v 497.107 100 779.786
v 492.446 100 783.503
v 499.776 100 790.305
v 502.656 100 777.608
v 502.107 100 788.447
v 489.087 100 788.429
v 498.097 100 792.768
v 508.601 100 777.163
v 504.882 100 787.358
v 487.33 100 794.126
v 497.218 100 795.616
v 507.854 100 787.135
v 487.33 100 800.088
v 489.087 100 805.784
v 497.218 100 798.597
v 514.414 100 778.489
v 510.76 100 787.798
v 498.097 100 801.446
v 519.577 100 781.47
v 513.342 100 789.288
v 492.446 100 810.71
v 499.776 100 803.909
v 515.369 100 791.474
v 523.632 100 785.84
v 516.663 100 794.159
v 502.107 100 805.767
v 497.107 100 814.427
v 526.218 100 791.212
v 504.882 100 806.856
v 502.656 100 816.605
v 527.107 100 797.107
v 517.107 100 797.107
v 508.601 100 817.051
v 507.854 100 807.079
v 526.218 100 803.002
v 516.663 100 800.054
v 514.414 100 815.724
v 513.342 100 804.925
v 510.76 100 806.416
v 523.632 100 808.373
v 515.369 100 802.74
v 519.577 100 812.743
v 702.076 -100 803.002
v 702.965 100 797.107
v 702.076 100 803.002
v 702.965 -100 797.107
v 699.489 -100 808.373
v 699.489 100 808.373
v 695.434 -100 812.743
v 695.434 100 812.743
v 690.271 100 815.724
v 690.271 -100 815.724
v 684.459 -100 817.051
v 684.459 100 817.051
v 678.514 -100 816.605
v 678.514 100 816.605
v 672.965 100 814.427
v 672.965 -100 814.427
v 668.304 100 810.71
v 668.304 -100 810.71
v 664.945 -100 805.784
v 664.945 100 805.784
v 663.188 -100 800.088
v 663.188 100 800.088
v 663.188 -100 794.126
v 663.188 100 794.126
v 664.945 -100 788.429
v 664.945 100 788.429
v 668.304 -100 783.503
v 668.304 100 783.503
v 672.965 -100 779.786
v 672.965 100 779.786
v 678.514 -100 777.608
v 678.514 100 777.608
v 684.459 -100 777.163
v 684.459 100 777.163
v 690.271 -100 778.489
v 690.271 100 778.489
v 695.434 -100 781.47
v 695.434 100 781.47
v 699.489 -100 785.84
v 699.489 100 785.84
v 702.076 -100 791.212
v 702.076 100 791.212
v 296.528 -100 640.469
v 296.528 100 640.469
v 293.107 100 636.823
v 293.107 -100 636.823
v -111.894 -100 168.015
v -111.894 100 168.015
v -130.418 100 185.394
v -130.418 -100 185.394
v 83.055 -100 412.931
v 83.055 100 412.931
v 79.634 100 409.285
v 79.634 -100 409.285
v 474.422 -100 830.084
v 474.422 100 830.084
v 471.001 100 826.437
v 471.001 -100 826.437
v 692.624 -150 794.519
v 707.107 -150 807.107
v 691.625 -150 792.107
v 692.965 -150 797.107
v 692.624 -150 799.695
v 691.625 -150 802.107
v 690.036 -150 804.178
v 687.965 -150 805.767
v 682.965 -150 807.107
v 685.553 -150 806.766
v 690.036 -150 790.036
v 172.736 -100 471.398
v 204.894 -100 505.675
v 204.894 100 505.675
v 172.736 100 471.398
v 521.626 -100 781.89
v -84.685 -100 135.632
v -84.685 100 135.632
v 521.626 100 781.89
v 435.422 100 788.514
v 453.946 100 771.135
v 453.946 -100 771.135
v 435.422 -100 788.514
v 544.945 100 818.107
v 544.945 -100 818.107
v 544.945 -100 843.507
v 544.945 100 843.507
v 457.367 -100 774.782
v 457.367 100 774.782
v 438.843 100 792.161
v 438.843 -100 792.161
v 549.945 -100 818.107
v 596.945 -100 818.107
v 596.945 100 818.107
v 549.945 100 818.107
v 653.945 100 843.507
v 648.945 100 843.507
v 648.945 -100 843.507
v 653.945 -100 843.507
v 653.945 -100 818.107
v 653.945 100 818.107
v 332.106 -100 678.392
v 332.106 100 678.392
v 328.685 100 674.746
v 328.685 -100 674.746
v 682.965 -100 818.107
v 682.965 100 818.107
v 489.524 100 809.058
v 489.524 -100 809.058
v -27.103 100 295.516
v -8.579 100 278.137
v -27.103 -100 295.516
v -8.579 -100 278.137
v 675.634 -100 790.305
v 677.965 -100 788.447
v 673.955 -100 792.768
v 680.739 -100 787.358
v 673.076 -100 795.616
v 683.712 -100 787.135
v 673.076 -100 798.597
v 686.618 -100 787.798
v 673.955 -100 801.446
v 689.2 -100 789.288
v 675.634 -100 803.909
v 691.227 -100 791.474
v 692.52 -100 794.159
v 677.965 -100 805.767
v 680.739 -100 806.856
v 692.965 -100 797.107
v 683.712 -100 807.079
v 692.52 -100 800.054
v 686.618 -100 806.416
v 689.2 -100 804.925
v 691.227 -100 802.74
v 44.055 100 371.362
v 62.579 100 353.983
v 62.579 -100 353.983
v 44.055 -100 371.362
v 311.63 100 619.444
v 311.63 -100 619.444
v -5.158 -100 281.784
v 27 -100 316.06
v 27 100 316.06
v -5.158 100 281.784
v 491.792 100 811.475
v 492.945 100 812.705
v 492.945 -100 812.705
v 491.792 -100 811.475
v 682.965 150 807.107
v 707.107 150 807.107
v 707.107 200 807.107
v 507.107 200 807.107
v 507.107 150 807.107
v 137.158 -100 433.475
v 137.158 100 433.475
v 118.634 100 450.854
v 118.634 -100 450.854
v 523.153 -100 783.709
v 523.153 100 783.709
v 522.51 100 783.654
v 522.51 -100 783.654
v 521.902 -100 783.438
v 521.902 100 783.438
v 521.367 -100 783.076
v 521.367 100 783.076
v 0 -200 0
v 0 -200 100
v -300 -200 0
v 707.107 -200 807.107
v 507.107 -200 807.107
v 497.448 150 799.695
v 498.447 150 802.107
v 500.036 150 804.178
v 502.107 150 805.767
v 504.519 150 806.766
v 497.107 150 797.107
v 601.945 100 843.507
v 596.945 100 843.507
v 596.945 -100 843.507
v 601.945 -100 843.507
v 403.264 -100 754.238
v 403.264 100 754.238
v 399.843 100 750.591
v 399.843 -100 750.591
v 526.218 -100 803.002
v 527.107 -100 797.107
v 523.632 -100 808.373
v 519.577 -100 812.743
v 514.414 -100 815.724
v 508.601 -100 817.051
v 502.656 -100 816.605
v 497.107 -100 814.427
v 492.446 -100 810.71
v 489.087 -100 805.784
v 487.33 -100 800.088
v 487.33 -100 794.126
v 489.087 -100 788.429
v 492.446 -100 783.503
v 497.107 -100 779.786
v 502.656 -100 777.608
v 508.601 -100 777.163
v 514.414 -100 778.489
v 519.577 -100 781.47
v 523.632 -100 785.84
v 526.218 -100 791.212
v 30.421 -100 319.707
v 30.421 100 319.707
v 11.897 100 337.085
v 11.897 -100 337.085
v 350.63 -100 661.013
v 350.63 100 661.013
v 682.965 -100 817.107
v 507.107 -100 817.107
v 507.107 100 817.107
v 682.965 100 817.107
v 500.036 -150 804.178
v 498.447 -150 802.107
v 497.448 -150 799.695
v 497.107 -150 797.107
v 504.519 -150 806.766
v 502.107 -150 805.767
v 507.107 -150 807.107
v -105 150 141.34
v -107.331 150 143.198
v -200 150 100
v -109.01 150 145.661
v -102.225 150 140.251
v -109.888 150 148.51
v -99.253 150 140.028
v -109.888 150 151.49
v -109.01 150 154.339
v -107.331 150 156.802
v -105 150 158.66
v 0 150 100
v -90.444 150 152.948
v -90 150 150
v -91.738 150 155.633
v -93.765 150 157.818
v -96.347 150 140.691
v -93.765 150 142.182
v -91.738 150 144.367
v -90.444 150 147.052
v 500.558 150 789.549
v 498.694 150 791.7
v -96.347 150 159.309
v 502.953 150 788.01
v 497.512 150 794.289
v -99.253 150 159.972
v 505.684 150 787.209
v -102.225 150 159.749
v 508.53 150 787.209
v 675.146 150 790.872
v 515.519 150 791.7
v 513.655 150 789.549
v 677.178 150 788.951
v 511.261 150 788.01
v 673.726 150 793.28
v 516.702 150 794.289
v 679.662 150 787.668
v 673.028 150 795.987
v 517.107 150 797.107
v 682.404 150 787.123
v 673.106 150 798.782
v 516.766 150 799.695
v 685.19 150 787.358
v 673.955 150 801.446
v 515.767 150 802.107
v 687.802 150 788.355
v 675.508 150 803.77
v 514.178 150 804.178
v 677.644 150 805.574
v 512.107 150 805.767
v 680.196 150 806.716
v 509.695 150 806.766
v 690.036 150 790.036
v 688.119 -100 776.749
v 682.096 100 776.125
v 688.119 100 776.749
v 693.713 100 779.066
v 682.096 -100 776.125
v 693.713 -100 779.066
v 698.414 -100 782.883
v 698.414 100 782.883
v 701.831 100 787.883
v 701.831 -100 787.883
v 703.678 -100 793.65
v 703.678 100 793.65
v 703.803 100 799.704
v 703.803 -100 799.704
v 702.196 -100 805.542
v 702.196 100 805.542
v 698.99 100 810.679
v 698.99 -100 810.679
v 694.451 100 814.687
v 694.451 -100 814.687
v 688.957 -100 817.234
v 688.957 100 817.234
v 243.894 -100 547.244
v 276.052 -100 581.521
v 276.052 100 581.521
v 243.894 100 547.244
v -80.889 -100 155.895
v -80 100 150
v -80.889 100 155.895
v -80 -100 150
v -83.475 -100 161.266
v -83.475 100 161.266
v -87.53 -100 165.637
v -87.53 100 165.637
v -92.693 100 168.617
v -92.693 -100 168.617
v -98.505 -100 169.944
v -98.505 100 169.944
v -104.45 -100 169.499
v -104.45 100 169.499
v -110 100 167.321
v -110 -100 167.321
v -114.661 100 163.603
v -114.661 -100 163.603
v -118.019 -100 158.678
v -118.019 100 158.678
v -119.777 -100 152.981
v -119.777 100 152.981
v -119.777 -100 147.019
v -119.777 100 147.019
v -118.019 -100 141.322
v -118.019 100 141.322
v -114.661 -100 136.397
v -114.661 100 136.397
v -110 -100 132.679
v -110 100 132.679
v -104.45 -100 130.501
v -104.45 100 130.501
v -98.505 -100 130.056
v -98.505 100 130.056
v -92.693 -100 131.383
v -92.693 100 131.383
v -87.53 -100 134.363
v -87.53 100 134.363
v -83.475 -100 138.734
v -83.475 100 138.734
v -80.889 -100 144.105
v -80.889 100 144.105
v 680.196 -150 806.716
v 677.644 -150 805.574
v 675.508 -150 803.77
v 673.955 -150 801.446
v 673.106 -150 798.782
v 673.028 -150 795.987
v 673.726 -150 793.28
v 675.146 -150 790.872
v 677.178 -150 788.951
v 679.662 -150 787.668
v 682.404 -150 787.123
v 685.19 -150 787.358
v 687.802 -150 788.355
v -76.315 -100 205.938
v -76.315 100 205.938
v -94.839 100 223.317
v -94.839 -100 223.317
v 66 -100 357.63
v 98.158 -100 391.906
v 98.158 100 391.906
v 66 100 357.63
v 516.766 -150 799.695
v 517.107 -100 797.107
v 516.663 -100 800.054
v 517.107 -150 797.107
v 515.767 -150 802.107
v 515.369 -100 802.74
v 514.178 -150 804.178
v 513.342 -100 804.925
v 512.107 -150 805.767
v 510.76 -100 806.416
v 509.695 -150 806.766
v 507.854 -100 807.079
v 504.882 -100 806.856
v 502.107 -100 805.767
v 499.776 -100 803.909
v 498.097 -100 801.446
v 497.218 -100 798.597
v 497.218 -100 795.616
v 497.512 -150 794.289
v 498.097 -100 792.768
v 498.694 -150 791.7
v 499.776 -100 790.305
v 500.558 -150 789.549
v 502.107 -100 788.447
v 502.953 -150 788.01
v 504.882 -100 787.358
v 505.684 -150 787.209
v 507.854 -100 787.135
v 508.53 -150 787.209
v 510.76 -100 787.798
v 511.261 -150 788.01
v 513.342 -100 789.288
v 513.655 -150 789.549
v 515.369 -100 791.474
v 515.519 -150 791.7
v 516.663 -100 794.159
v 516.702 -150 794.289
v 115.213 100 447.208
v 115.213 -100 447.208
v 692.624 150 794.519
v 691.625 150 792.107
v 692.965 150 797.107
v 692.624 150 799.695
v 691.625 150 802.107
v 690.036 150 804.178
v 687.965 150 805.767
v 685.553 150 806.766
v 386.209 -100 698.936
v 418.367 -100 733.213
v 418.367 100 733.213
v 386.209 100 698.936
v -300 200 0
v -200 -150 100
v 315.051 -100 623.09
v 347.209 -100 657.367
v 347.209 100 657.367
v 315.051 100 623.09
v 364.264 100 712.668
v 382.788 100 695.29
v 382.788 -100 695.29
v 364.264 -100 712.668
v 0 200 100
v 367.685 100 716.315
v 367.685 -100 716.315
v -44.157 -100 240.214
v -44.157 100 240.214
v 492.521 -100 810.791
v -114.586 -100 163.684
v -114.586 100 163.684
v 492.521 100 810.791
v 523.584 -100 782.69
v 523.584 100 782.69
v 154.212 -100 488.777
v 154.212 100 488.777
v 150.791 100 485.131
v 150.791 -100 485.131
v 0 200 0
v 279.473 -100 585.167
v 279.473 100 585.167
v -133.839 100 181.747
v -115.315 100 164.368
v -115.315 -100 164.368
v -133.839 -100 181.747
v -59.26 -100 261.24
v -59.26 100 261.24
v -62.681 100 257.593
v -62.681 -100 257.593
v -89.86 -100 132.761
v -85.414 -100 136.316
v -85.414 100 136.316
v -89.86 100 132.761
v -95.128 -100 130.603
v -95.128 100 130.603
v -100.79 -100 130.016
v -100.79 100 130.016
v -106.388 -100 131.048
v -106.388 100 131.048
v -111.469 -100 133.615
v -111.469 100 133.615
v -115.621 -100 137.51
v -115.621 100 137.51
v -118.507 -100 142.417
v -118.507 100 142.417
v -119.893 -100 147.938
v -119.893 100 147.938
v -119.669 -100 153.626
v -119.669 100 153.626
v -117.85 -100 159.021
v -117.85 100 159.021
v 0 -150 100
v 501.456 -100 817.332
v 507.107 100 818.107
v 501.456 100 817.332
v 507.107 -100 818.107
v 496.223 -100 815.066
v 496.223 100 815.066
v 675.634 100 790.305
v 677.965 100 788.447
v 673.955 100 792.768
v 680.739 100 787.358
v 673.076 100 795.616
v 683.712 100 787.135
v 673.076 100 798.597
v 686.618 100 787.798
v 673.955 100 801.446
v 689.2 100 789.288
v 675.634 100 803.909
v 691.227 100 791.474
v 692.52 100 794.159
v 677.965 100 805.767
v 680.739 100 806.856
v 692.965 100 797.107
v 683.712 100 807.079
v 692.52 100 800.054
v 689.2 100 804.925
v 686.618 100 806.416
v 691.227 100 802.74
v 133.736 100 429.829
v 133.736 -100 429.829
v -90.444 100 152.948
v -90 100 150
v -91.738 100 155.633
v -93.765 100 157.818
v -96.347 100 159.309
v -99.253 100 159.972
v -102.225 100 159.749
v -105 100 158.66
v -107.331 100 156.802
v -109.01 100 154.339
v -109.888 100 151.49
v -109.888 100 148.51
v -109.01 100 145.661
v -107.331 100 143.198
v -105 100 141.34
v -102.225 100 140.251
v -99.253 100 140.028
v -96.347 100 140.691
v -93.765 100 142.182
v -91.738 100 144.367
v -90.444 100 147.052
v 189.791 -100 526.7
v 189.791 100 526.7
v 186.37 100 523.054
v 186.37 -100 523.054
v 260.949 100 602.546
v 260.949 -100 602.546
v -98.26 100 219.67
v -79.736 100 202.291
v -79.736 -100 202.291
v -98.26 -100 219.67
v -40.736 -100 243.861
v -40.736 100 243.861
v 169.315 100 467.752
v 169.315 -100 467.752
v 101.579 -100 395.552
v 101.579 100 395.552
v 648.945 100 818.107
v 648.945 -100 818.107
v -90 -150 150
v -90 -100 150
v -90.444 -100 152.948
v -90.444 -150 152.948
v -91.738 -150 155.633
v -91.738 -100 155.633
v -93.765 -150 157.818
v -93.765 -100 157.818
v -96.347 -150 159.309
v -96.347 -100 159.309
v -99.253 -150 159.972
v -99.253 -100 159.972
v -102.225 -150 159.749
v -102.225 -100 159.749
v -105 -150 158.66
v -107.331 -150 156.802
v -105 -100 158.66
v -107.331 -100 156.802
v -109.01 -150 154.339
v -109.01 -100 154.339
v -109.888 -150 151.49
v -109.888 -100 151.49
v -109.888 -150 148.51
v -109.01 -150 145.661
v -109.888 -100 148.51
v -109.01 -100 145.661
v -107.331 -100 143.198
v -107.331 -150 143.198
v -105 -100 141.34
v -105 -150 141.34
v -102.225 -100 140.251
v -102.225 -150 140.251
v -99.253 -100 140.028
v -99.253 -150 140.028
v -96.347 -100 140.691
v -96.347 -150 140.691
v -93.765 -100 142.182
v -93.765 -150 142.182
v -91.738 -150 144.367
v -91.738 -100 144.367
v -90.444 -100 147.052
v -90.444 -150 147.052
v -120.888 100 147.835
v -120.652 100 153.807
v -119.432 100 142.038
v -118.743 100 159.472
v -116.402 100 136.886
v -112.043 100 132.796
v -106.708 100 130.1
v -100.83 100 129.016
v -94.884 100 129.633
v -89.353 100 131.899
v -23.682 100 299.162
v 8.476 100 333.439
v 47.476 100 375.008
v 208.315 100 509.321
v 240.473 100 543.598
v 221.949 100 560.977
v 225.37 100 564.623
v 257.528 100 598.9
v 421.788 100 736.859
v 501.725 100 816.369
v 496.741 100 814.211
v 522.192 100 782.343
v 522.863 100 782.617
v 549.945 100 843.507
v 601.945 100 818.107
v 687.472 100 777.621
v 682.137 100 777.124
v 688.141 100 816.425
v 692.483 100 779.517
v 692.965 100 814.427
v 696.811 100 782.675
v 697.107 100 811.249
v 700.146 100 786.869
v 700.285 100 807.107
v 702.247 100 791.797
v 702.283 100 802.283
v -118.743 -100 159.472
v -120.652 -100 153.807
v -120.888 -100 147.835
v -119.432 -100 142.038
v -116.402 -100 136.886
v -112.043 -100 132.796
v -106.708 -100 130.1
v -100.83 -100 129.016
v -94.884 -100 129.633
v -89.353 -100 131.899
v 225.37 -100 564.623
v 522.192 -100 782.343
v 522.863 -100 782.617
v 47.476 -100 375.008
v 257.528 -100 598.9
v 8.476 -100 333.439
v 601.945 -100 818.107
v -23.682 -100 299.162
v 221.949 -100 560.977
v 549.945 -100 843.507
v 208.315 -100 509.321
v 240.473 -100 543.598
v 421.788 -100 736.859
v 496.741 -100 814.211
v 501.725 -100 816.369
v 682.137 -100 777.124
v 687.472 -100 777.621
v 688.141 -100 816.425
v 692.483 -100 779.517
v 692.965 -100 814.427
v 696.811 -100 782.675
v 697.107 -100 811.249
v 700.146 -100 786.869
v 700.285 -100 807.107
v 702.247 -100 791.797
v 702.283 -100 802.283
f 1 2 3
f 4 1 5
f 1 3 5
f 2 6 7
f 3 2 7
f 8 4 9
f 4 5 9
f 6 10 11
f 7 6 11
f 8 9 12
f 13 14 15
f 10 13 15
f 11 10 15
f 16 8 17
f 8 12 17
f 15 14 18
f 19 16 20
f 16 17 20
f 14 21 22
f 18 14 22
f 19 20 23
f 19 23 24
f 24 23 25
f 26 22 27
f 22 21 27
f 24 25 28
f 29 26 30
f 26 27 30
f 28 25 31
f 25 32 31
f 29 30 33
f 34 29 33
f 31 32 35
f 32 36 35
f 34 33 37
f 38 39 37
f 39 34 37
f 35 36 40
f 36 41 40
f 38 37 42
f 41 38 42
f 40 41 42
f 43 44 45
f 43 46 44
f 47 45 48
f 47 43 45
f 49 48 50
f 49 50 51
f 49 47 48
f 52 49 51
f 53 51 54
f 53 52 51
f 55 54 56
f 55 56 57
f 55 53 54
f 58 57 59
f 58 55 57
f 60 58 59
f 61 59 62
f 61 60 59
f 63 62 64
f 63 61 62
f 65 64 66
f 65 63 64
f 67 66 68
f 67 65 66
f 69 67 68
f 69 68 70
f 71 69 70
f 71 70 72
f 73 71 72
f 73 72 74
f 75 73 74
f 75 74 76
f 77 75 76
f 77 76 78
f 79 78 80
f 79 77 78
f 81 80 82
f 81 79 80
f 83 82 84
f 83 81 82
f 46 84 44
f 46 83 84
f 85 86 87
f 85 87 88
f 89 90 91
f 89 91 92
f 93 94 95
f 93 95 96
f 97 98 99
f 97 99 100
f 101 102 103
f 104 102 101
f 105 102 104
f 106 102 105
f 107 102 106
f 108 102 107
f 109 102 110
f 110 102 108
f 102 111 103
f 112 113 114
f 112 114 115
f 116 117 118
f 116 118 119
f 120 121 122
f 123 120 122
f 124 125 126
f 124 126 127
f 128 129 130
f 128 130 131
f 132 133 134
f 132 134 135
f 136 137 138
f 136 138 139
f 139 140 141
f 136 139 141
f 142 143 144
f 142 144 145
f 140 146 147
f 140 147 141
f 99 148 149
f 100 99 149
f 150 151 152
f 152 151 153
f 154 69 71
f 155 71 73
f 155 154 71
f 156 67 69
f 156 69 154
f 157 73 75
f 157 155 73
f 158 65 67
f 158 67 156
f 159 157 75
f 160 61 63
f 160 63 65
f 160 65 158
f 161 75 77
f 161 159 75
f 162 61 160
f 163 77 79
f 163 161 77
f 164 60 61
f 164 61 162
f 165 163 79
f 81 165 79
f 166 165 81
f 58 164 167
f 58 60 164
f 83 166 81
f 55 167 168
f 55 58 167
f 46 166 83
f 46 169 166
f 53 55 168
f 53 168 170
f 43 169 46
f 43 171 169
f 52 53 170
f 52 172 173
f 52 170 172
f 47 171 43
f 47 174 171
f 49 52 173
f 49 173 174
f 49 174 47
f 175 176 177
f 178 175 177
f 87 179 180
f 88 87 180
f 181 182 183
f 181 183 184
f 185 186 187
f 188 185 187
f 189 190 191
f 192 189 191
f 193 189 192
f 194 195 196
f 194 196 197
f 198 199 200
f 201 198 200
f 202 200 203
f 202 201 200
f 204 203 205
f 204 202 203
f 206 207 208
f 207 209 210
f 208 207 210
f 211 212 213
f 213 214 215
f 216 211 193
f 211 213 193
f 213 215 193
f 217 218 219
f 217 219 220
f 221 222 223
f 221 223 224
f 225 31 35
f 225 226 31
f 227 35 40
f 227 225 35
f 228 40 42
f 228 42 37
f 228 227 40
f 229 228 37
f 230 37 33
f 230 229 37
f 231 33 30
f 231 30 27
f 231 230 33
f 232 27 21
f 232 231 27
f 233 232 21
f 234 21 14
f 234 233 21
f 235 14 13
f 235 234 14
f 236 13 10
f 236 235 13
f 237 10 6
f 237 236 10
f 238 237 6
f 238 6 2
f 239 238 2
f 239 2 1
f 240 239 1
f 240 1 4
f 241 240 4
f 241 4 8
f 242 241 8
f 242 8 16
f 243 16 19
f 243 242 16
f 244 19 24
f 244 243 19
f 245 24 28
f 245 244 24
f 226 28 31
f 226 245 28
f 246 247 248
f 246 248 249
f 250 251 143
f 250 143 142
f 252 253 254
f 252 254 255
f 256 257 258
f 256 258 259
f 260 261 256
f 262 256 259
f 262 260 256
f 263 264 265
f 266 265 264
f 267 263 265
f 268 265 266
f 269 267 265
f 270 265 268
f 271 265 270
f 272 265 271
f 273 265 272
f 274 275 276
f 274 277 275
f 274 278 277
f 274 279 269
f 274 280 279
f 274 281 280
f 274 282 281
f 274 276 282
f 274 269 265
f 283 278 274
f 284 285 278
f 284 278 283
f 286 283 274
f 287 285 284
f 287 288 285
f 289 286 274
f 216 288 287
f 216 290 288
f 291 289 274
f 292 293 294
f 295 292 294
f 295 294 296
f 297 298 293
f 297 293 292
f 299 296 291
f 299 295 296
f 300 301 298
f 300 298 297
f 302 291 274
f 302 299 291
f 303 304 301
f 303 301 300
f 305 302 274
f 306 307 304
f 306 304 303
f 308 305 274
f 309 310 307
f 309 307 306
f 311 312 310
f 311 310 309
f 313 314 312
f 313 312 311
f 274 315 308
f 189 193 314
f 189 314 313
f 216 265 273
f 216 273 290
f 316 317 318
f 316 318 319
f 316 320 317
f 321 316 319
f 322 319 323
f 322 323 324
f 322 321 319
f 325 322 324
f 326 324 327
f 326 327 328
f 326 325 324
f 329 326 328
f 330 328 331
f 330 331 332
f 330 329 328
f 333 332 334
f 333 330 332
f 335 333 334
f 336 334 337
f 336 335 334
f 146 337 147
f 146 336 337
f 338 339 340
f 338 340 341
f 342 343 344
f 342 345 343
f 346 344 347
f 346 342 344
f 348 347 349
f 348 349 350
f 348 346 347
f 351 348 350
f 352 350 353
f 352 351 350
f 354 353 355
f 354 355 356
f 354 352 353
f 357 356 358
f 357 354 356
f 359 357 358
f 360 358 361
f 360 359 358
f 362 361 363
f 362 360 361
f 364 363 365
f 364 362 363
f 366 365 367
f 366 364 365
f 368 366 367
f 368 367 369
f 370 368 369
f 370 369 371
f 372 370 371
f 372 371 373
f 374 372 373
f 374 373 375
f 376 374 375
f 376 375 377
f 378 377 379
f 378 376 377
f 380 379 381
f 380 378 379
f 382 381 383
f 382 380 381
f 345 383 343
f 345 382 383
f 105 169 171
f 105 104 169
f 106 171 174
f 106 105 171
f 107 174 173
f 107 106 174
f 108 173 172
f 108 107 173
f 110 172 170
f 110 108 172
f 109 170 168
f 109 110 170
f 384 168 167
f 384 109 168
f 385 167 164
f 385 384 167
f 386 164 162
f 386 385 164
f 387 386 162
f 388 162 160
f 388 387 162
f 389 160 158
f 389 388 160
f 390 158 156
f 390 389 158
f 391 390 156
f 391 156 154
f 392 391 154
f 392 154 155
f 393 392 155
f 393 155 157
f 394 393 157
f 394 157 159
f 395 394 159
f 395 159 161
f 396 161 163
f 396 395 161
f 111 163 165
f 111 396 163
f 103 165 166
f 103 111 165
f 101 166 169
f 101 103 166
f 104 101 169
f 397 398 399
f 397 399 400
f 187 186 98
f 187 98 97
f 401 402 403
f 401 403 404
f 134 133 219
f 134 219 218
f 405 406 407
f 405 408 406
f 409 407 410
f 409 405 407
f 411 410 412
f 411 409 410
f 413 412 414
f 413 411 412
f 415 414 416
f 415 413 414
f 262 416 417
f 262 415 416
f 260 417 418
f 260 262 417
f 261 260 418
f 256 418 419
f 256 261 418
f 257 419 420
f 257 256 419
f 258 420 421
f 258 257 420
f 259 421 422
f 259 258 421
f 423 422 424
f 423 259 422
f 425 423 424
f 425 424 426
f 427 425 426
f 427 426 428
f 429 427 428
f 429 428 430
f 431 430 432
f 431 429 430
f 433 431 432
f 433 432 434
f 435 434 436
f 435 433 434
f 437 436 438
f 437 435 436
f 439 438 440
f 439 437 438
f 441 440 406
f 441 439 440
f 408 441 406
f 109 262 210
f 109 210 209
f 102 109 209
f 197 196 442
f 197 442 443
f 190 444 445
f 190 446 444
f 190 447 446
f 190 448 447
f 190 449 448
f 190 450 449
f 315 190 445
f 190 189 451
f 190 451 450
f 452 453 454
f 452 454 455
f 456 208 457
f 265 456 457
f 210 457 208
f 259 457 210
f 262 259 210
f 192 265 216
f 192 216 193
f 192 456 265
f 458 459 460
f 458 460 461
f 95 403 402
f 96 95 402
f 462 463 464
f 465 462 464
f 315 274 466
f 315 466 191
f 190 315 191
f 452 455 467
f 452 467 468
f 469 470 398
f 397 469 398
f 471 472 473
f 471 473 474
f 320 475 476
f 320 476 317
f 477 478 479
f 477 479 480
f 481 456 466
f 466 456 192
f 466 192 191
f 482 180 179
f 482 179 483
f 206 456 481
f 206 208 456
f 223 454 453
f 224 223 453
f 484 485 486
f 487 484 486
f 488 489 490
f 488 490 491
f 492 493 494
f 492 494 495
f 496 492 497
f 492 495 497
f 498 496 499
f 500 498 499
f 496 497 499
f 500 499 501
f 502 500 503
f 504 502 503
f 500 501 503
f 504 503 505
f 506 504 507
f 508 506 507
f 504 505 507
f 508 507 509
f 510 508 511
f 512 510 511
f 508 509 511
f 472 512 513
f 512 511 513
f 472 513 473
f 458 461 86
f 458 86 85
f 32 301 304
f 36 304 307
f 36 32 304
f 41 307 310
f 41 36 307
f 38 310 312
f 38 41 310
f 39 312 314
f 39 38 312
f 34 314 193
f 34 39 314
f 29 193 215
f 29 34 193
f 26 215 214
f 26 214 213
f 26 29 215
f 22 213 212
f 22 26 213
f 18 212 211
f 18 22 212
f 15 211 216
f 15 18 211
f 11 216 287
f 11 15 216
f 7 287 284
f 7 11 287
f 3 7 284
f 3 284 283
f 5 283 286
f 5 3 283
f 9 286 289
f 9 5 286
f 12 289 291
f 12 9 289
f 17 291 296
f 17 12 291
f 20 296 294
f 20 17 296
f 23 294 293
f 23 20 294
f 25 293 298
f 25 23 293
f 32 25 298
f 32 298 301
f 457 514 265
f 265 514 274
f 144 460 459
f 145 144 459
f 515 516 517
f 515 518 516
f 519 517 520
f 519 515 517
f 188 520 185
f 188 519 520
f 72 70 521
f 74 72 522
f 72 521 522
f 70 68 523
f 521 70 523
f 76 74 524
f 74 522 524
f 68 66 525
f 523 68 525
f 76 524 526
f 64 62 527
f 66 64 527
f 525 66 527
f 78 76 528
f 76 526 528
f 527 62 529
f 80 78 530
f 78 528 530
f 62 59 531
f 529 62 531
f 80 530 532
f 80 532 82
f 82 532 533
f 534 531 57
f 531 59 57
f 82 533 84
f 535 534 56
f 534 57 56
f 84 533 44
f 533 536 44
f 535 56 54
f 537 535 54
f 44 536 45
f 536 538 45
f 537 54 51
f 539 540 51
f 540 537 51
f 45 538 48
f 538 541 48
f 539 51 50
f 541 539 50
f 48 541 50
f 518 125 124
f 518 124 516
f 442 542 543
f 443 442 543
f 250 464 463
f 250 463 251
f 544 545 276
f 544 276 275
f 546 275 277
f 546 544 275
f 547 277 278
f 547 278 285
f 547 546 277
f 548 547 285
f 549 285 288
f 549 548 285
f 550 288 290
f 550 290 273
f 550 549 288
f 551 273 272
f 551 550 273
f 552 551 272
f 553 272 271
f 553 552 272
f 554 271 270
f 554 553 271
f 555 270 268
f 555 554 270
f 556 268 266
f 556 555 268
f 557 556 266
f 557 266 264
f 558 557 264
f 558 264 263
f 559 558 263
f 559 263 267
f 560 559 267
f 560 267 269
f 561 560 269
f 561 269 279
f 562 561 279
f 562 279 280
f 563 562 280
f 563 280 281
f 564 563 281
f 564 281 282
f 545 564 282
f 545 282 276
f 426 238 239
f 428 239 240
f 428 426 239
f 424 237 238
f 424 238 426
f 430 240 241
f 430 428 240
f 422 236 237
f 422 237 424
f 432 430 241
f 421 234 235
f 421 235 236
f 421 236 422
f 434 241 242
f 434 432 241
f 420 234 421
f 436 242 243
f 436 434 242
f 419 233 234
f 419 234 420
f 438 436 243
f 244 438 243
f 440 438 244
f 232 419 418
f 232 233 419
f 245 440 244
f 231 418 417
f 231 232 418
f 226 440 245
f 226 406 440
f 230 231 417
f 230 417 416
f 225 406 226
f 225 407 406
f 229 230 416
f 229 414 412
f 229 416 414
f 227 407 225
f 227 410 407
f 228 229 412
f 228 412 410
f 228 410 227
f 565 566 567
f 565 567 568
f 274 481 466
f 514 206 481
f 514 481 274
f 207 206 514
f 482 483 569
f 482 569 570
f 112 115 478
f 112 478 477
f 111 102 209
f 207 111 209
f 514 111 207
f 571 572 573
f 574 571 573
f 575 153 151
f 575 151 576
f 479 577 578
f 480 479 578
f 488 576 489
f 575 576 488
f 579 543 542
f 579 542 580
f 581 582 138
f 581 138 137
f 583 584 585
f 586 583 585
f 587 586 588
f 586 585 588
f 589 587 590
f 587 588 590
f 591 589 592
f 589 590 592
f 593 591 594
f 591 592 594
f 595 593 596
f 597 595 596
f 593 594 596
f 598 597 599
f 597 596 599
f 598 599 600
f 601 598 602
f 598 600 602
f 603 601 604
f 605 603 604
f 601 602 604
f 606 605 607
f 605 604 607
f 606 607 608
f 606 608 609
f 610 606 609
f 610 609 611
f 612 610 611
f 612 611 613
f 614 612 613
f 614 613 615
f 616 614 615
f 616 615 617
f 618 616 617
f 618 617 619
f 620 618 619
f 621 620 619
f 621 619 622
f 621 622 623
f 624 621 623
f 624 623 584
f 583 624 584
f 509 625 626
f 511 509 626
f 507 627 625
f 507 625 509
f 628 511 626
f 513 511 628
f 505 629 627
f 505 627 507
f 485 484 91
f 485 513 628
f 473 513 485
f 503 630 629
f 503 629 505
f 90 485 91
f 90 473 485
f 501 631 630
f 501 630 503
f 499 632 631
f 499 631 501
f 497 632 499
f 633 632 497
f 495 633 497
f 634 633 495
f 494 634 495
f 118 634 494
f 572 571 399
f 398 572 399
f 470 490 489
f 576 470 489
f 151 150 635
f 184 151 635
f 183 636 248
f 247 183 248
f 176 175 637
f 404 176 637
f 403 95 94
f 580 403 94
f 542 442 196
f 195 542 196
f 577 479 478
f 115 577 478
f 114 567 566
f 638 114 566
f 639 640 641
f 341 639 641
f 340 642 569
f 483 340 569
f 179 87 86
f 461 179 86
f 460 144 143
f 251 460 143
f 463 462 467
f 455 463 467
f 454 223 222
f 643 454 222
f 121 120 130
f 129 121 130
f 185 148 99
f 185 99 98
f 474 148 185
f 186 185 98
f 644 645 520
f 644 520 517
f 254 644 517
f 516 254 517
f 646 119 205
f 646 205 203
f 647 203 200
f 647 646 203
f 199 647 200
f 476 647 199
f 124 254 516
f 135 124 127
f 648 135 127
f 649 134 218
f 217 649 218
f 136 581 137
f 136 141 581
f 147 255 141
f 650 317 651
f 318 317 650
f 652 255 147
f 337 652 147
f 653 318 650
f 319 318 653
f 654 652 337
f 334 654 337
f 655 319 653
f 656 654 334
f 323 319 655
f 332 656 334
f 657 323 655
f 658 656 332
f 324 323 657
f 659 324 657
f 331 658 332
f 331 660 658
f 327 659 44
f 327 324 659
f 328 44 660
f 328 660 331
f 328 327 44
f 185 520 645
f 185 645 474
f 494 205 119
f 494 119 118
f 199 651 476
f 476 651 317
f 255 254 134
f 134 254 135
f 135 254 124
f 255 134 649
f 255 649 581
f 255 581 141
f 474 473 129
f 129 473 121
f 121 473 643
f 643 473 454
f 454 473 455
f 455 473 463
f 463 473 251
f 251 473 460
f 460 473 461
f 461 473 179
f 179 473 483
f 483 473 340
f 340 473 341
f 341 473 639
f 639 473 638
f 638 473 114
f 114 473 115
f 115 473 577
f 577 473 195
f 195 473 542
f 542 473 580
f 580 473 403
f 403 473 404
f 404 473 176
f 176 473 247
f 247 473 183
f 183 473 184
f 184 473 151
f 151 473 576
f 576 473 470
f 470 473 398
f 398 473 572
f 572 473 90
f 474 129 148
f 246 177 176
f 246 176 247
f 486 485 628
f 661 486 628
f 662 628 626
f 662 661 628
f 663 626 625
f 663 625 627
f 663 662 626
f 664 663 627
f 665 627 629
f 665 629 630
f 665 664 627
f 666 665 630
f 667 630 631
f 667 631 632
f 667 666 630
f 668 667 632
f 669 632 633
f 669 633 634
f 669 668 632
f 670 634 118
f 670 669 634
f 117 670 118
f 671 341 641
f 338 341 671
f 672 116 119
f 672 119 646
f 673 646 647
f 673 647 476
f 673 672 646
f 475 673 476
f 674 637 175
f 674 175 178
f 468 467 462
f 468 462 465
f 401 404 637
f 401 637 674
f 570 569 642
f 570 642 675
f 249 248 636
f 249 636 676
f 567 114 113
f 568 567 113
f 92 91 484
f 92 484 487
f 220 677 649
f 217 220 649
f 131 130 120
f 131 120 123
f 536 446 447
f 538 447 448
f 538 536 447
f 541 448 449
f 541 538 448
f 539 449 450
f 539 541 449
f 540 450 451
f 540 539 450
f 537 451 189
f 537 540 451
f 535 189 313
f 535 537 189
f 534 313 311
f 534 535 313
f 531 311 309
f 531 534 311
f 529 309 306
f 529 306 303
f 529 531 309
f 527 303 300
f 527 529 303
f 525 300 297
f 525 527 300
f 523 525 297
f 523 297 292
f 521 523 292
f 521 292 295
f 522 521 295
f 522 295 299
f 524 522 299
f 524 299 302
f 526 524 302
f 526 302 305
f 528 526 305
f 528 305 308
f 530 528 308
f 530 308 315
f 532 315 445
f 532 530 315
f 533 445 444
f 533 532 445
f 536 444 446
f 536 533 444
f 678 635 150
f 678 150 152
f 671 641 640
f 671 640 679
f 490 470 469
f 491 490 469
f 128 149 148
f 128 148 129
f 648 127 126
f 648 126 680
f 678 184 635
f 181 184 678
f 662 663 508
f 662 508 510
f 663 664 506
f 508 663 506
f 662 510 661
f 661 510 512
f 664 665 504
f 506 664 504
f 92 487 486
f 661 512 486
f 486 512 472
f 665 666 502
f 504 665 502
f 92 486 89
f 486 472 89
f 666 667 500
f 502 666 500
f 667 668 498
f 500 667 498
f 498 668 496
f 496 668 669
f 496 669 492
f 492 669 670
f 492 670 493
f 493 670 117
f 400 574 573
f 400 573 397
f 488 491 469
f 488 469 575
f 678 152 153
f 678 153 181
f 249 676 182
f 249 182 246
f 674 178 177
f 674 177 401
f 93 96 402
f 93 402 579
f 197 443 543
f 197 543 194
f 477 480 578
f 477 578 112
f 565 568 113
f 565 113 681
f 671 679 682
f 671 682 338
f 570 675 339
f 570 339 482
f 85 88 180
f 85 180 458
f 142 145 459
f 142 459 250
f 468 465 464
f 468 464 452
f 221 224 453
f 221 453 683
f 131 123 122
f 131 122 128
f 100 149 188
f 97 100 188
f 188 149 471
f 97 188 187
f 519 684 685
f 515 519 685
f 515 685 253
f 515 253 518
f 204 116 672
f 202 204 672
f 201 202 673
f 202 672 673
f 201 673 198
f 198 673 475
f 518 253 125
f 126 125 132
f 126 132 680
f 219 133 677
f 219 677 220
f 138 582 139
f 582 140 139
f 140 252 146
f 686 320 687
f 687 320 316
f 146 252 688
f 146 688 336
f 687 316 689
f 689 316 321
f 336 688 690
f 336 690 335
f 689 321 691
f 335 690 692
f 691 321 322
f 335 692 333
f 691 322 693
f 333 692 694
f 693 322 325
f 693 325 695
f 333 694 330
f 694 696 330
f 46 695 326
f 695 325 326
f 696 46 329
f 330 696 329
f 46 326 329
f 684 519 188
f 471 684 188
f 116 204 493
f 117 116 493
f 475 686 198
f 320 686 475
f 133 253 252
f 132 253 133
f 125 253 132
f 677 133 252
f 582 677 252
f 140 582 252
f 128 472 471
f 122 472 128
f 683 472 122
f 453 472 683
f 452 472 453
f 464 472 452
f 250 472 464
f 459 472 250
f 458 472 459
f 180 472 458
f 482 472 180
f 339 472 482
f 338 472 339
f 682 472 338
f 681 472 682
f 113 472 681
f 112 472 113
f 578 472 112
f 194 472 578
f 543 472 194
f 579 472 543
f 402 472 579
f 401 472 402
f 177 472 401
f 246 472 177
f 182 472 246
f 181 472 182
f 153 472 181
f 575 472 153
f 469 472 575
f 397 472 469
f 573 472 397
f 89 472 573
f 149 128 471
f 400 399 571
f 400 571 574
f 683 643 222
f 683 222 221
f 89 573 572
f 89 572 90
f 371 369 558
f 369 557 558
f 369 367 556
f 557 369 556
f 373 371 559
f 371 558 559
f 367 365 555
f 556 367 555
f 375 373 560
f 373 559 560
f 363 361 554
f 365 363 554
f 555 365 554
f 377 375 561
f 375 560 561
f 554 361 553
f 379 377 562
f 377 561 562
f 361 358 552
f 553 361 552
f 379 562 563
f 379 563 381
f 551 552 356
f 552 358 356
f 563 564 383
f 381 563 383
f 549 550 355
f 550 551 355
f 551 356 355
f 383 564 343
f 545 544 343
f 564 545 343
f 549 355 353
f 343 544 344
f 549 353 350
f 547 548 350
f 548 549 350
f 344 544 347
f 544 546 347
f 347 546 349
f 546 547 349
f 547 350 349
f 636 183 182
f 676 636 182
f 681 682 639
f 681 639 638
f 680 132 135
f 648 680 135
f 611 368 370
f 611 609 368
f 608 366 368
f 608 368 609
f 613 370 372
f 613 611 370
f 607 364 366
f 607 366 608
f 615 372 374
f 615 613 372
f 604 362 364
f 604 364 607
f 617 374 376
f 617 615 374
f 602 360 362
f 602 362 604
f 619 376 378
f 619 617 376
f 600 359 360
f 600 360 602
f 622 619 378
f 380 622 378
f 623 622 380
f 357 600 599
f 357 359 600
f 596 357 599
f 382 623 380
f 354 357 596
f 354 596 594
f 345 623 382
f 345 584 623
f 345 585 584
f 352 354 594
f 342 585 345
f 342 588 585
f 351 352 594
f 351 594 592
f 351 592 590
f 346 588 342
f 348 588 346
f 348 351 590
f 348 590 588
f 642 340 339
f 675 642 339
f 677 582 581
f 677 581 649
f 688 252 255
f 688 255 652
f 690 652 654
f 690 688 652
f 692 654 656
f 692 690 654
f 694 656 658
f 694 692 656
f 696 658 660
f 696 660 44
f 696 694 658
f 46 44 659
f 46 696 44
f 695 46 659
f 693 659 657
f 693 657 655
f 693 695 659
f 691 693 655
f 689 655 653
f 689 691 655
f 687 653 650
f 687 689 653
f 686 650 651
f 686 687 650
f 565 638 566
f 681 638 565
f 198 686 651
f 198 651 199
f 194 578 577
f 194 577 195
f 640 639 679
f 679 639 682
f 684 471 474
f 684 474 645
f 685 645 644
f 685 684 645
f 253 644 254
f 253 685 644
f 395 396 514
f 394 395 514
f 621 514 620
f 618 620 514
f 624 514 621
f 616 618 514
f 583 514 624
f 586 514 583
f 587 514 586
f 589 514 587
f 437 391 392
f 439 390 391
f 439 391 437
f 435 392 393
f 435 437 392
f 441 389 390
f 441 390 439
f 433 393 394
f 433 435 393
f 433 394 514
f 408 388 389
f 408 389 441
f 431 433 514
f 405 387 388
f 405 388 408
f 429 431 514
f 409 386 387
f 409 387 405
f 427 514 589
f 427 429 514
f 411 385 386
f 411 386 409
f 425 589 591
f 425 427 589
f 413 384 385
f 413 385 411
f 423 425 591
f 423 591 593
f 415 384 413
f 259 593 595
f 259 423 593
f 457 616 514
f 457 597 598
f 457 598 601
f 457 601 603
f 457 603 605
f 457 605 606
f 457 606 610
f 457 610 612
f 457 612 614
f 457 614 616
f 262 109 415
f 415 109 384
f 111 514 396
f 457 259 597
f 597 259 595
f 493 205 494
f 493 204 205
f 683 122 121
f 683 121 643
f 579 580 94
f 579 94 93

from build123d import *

# Parameters (mm, degrees)
F1_DEPTH  = 200
F2_W      = 300
F2_H      = 200
F3_DEPTH  = 228.6
F5_DEPTH  = 50
F7_DEPTH  = 50
F8_R      = 10
F9_DEPTH  = 150
F10_R     = 20
F11_DEPTH = 100
F12_R     = 10
F13_DEPTH = 150
F14_R     = 20
F15_DEPTH = 100
F17_DEPTH = 100
F18_W     = 200
F18_H     = 5
F19_DEPTH = 25.4
F20_W     = 5
F20_H     = 200
F21_DEPTH = 25.4


with BuildPart() as f1:
    # F0 (on Front) → F1 (new body, symmetric)
    with BuildSketch(Plane.XZ):
        Polygon((-300, 0), (0, 0), (0, 300), align=None)
    extrude(amount=F1_DEPTH, both=True)

    # F2 (on face) → F3 (cut)
    with BuildSketch(Plane.YZ):
        with Locations((0, 200)):
            Rectangle(F2_W, F2_H)
    extrude(amount=-F3_DEPTH, mode=Mode.SUBTRACT)

    # F4 (on face) → F5 (join, through all)
    with BuildSketch(Plane.XZ.offset(-150)):
        Polygon((0, 300), (0, 100), (707.1067811865, 807.1067811865), (507.1067811865, 807.1067811865), align=None)
    extrude(amount=-F5_DEPTH)

    # F6 (on face) → F7 (join, through all)
    with BuildSketch(Plane(origin=(0, -150, 0), x_dir=(-1, 0, 0), z_dir=(0, 1, 0))):
        Polygon((-707.1067811865, 807.1067811865), (0, 100), (0, 300), (-507.1067811865, 807.1067811865), align=None)
    extrude(amount=-F7_DEPTH)

    # F8 (on Front) → F9 (join, symmetric)
    with BuildSketch(Plane.XZ):
        with Locations((682.9646455628, 797.1067811865)):
            Circle(F8_R)
    extrude(amount=F9_DEPTH, both=True)

    # F10 (on Front) → F11 (join, symmetric)
    with BuildSketch(Plane.XZ):
        with Locations((682.9646455628, 797.1067811865)):
            Circle(F10_R)
    extrude(amount=F11_DEPTH, both=True)

    # F12 (on Front) → F13 (join, symmetric)
    with BuildSketch(Plane.XZ):
        with Locations((-100, 150)):
            Circle(F12_R)
        with Locations((507.1067811865, 797.1067811865)):
            Circle(F12_R)
    extrude(amount=F13_DEPTH, both=True)

    # F14 (on Front) → F15 (join, symmetric)
    with BuildSketch(Plane.XZ):
        with Locations((-100, 150)):
            Circle(F14_R)
        with Locations((507.1067811865, 797.1067811865)):
            Circle(F14_R)
    extrude(amount=F15_DEPTH, both=True)


with BuildPart() as f17:
    # F16 (on Front) → F17 (new body, symmetric)
    with BuildSketch(Plane.XZ):
        with BuildLine():
            Line((491.7917461106, 811.475138804), (-115.315035076, 164.3683576174))
            ThreePointArc((-115.315035076, 164.3683576174), (-114.3683576174, 134.684964924), (-84.684964924, 135.6316423826))
            Line((-84.684964924, 135.6316423826), (521.6261767947, 781.8903623862))
            ThreePointArc((521.6261767947, 781.8903623862), (522.5177253248, 782.5037268511), (523.5836828593, 782.690299312))
            Line((523.5836828593, 782.690299312), (682.0955753807, 776.1247718209))
            ThreePointArc((682.0955753807, 776.1247718209), (703.9601474225, 796.6721529993), (682.9646455628, 818.1067811865))
            Line((682.9646455628, 818.1067811865), (507.1067811865, 818.1067811865))
            ThreePointArc((507.1067811865, 818.1067811865), (498.7621874267, 816.3776855499), (491.7917461106, 811.475138804))
        make_face()
        with BuildLine():
            ThreePointArc((-85.4142523086, 136.3158498882), (-113.6841501118, 135.4142523086), (-114.5857476914, 163.6841501118))
            Line((-114.5857476914, 163.6841501118), (492.5210334951, 810.7909312984))
            ThreePointArc((492.5210334951, 810.7909312984), (499.1595490343, 815.4600234374), (507.1067811865, 817.1067811865))
            Line((507.1067811865, 817.1067811865), (682.9646455628, 817.1067811865))
            ThreePointArc((682.9646455628, 817.1067811865), (697.1067811865, 811.2489168103), (702.9646455628, 797.1067811865))
            ThreePointArc((702.9646455628, 797.1067811865), (696.8110581351, 782.6749809219), (682.1369596751, 777.1239151241))
            Line((682.1369596751, 777.1239151241), (523.1526744106, 783.7090090179))
            ThreePointArc((523.1526744106, 783.7090090179), (522.1988688728, 783.5652038774), (521.3674580584, 783.0761425521))
            Line((521.3674580584, 783.0761425521), (-85.4142523086, 136.3158498882))
        make_face(mode=Mode.SUBTRACT)
    extrude(amount=F17_DEPTH, both=True)

    # F18 (on face) → F19 (join)
    with BuildSketch(Plane(origin=(-143.3486293437, 0, 134.4877344489), x_dir=(0, -1, 0), z_dir=(-0.7292873846, 0, 0.6842075056))):
        with Locations((0, 43.4723571265)):
            Rectangle(F18_W, F18_H)
        with Locations((0, 95.4723571265)):
            Rectangle(F18_W, F18_H)
        with Locations((0, 147.4723571265)):
            Rectangle(F18_W, F18_H)
        with Locations((0, 199.4723571265)):
            Rectangle(F18_W, F18_H)
        with Locations((0, 251.4723571265)):
            Rectangle(F18_W, F18_H)
        with Locations((0, 303.4723571265)):
            Rectangle(F18_W, F18_H)
        with Locations((0, 355.4723571265)):
            Rectangle(F18_W, F18_H)
        with Locations((0, 407.4723571265)):
            Rectangle(F18_W, F18_H)
        with Locations((0, 459.4723571265)):
            Rectangle(F18_W, F18_H)
        with Locations((0, 511.4723571265)):
            Rectangle(F18_W, F18_H)
        with Locations((0, 563.4723571265)):
            Rectangle(F18_W, F18_H)
        with Locations((0, 615.4723571265)):
            Rectangle(F18_W, F18_H)
        with Locations((0, 667.4723571265)):
            Rectangle(F18_W, F18_H)
        with Locations((0, 719.4723571265)):
            Rectangle(F18_W, F18_H)
        with Locations((0, 771.4723571265)):
            Rectangle(F18_W, F18_H)
        with Locations((0, 823.4723571265)):
            Rectangle(F18_W, F18_H)
        with Locations((0, 875.4723571265)):
            Rectangle(F18_W, F18_H)
        with Locations((0, 927.4723571265)):
            Rectangle(F18_W, F18_H)
    extrude(amount=F19_DEPTH)

    # F20 (on face) → F21 (join)
    with BuildSketch(Plane.XY.offset(818.1067811865)):
        with Locations((547.4454373941, 0)):
            Rectangle(F20_W, F20_H)
        with Locations((599.4454373941, 0)):
            Rectangle(F20_W, F20_H)
        with Locations((651.4454373941, 0)):
            Rectangle(F20_W, F20_H)
    extrude(amount=F21_DEPTH)


solid = Compound([f1.part, f17.part])
